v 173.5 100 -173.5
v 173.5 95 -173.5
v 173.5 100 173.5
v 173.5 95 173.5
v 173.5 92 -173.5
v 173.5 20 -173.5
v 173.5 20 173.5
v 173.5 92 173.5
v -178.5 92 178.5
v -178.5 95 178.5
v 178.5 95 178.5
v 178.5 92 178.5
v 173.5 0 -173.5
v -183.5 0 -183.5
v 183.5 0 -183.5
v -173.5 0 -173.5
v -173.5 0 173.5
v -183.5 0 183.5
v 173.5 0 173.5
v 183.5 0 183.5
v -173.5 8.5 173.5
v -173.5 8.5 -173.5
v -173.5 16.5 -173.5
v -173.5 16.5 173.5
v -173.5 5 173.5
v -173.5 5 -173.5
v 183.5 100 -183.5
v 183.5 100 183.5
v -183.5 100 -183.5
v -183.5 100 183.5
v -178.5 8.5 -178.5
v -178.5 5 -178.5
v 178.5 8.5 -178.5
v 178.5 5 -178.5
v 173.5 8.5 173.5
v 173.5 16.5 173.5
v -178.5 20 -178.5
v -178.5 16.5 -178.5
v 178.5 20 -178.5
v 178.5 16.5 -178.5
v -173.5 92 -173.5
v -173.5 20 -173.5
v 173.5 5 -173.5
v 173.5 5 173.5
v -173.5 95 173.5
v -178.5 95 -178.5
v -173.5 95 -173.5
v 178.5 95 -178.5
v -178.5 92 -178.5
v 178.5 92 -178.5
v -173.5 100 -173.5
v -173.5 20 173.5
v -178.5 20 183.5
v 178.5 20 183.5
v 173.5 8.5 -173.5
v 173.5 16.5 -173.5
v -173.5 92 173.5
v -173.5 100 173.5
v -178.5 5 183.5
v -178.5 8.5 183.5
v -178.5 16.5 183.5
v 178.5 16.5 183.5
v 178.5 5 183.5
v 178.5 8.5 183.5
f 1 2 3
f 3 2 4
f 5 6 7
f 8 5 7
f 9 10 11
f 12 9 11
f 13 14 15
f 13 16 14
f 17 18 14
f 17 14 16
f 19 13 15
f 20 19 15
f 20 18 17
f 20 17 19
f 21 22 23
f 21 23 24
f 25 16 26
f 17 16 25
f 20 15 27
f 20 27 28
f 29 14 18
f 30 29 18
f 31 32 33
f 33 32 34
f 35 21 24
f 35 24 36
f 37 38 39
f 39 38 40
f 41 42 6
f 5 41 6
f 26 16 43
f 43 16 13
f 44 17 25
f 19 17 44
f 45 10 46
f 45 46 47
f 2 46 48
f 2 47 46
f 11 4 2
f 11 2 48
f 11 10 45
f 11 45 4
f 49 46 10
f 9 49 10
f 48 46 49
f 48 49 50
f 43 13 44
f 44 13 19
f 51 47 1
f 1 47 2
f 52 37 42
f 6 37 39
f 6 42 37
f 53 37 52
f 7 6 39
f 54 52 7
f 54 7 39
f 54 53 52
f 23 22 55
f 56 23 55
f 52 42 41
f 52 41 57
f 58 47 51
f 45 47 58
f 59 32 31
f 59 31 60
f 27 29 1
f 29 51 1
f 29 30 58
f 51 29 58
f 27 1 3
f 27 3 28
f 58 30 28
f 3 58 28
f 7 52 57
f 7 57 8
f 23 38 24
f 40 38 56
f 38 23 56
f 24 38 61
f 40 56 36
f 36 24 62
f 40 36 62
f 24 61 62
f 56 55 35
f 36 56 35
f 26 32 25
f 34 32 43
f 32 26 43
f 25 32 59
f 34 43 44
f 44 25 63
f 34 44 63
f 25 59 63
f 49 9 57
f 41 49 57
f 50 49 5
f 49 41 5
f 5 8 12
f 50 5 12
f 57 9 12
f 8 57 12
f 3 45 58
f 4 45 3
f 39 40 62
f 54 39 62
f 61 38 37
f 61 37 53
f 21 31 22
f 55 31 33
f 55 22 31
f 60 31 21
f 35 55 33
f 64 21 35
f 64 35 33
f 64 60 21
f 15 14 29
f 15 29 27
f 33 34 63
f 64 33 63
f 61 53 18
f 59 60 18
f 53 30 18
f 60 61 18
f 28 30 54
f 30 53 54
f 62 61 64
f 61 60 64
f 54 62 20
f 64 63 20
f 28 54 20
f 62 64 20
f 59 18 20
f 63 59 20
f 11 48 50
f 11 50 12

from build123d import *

# Parameters (mm, degrees)
F1_W      = 367
F1_H      = 367
F2_DEPTH  = 100
F3_W      = 347
F3_H      = 347
F4_DEPTH  = 100.001
F6_W      = 357
F6_H      = 362
F7_DEPTH  = 3.5
F9_W      = 357
F9_H      = 357
F10_DEPTH = 3
F12_W     = 357
F12_H     = 362
F13_DEPTH = 3.5


with BuildPart() as f2:
    # F1 (on Front) → F2 (new body)
    with BuildSketch(Plane.XZ):
        Rectangle(F1_W, F1_H)
    extrude(amount=-F2_DEPTH)

    # F3 (on Front) → F4 (cut, through all)
    with BuildSketch(Plane.XZ):
        Rectangle(F3_W, F3_H)
    extrude(amount=-F4_DEPTH, mode=Mode.SUBTRACT)

    # F6 (on offset) → F7 (cut)
    with BuildSketch(Plane.XZ.offset(-5)):
        with Locations((0, 2.5)):
            Rectangle(F6_W, F6_H)
    extrude(amount=-F7_DEPTH, mode=Mode.SUBTRACT)

    # F9 (on offset) → F10 (cut)
    with BuildSketch(Plane.XZ.offset(-95)):
        Rectangle(F9_W, F9_H)
    extrude(amount=F10_DEPTH, mode=Mode.SUBTRACT)

    # F12 (on offset) → F13 (cut)
    with BuildSketch(Plane.XZ.offset(-16.5)):
        with Locations((0, 2.5)):
            Rectangle(F12_W, F12_H)
    extrude(amount=-F13_DEPTH, mode=Mode.SUBTRACT)


solid = f2.part
